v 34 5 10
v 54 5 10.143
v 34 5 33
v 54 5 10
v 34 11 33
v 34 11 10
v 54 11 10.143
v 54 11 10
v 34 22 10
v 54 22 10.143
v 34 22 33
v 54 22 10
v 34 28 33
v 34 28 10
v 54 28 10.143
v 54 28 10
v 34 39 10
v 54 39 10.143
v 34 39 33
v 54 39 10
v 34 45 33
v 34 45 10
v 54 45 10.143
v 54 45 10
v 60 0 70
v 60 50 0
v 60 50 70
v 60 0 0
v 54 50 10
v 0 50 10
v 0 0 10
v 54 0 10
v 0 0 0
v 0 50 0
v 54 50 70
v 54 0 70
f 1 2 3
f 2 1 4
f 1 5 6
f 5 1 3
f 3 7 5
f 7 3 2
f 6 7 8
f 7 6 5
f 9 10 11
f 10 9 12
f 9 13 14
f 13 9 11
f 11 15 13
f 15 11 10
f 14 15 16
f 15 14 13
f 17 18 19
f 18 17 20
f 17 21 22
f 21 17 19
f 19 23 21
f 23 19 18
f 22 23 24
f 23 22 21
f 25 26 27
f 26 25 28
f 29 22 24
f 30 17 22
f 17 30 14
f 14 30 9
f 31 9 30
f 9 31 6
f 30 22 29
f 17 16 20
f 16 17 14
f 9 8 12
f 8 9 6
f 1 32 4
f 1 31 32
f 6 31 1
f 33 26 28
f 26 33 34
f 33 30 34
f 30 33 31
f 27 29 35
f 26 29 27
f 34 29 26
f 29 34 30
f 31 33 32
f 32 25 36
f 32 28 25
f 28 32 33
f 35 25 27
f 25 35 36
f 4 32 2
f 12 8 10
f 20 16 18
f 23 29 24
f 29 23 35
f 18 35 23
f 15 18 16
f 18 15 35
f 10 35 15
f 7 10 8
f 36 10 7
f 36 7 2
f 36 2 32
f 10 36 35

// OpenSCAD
$fn = 32;

// ----------------------------------------------------------------------
// Rib bracket: 3-gusset L bracket
// ----------------------------------------------------------------------

// --- parameters (mm) ---
base_l = 60;              // foot length, X
base_w = 50;              // foot width, Y
base_t = 10;              // foot thickness
plate_t = 6;              // upright plate thickness
plate_h = 70;             // overall height
gus_l = 20;               // gusset leg along the foot
gus_h = 24;               // gusset height
gus_t = 6;                // gusset thickness
gus_edge = 5;             // gusset margin from the foot edge
n_gus = 3;                // gusset count
fit_tol = 0.02;           // tolerance for press fits, mm
free_tol = 0.2;           // tolerance for clearance fits, mm

gus_pitch = (base_w - 2 * gus_edge - gus_t) / (n_gus - 1);  // gusset pitch

union() {
  cube([base_l, base_w, base_t]);
  translate([base_l - plate_t, 0, base_t - 1])
    cube([plate_t, base_w, plate_h - base_t + 1]);
  for (i = [0 : n_gus - 1])
    translate([base_l - plate_t - gus_l, gus_edge + i * gus_pitch, base_t - 1])
      rotate([-90, 0, 0])
        linear_extrude(height = gus_t)
          polygon(points = [[0, 0], [gus_l + 1, 0], [0, -gus_h]]);
}
